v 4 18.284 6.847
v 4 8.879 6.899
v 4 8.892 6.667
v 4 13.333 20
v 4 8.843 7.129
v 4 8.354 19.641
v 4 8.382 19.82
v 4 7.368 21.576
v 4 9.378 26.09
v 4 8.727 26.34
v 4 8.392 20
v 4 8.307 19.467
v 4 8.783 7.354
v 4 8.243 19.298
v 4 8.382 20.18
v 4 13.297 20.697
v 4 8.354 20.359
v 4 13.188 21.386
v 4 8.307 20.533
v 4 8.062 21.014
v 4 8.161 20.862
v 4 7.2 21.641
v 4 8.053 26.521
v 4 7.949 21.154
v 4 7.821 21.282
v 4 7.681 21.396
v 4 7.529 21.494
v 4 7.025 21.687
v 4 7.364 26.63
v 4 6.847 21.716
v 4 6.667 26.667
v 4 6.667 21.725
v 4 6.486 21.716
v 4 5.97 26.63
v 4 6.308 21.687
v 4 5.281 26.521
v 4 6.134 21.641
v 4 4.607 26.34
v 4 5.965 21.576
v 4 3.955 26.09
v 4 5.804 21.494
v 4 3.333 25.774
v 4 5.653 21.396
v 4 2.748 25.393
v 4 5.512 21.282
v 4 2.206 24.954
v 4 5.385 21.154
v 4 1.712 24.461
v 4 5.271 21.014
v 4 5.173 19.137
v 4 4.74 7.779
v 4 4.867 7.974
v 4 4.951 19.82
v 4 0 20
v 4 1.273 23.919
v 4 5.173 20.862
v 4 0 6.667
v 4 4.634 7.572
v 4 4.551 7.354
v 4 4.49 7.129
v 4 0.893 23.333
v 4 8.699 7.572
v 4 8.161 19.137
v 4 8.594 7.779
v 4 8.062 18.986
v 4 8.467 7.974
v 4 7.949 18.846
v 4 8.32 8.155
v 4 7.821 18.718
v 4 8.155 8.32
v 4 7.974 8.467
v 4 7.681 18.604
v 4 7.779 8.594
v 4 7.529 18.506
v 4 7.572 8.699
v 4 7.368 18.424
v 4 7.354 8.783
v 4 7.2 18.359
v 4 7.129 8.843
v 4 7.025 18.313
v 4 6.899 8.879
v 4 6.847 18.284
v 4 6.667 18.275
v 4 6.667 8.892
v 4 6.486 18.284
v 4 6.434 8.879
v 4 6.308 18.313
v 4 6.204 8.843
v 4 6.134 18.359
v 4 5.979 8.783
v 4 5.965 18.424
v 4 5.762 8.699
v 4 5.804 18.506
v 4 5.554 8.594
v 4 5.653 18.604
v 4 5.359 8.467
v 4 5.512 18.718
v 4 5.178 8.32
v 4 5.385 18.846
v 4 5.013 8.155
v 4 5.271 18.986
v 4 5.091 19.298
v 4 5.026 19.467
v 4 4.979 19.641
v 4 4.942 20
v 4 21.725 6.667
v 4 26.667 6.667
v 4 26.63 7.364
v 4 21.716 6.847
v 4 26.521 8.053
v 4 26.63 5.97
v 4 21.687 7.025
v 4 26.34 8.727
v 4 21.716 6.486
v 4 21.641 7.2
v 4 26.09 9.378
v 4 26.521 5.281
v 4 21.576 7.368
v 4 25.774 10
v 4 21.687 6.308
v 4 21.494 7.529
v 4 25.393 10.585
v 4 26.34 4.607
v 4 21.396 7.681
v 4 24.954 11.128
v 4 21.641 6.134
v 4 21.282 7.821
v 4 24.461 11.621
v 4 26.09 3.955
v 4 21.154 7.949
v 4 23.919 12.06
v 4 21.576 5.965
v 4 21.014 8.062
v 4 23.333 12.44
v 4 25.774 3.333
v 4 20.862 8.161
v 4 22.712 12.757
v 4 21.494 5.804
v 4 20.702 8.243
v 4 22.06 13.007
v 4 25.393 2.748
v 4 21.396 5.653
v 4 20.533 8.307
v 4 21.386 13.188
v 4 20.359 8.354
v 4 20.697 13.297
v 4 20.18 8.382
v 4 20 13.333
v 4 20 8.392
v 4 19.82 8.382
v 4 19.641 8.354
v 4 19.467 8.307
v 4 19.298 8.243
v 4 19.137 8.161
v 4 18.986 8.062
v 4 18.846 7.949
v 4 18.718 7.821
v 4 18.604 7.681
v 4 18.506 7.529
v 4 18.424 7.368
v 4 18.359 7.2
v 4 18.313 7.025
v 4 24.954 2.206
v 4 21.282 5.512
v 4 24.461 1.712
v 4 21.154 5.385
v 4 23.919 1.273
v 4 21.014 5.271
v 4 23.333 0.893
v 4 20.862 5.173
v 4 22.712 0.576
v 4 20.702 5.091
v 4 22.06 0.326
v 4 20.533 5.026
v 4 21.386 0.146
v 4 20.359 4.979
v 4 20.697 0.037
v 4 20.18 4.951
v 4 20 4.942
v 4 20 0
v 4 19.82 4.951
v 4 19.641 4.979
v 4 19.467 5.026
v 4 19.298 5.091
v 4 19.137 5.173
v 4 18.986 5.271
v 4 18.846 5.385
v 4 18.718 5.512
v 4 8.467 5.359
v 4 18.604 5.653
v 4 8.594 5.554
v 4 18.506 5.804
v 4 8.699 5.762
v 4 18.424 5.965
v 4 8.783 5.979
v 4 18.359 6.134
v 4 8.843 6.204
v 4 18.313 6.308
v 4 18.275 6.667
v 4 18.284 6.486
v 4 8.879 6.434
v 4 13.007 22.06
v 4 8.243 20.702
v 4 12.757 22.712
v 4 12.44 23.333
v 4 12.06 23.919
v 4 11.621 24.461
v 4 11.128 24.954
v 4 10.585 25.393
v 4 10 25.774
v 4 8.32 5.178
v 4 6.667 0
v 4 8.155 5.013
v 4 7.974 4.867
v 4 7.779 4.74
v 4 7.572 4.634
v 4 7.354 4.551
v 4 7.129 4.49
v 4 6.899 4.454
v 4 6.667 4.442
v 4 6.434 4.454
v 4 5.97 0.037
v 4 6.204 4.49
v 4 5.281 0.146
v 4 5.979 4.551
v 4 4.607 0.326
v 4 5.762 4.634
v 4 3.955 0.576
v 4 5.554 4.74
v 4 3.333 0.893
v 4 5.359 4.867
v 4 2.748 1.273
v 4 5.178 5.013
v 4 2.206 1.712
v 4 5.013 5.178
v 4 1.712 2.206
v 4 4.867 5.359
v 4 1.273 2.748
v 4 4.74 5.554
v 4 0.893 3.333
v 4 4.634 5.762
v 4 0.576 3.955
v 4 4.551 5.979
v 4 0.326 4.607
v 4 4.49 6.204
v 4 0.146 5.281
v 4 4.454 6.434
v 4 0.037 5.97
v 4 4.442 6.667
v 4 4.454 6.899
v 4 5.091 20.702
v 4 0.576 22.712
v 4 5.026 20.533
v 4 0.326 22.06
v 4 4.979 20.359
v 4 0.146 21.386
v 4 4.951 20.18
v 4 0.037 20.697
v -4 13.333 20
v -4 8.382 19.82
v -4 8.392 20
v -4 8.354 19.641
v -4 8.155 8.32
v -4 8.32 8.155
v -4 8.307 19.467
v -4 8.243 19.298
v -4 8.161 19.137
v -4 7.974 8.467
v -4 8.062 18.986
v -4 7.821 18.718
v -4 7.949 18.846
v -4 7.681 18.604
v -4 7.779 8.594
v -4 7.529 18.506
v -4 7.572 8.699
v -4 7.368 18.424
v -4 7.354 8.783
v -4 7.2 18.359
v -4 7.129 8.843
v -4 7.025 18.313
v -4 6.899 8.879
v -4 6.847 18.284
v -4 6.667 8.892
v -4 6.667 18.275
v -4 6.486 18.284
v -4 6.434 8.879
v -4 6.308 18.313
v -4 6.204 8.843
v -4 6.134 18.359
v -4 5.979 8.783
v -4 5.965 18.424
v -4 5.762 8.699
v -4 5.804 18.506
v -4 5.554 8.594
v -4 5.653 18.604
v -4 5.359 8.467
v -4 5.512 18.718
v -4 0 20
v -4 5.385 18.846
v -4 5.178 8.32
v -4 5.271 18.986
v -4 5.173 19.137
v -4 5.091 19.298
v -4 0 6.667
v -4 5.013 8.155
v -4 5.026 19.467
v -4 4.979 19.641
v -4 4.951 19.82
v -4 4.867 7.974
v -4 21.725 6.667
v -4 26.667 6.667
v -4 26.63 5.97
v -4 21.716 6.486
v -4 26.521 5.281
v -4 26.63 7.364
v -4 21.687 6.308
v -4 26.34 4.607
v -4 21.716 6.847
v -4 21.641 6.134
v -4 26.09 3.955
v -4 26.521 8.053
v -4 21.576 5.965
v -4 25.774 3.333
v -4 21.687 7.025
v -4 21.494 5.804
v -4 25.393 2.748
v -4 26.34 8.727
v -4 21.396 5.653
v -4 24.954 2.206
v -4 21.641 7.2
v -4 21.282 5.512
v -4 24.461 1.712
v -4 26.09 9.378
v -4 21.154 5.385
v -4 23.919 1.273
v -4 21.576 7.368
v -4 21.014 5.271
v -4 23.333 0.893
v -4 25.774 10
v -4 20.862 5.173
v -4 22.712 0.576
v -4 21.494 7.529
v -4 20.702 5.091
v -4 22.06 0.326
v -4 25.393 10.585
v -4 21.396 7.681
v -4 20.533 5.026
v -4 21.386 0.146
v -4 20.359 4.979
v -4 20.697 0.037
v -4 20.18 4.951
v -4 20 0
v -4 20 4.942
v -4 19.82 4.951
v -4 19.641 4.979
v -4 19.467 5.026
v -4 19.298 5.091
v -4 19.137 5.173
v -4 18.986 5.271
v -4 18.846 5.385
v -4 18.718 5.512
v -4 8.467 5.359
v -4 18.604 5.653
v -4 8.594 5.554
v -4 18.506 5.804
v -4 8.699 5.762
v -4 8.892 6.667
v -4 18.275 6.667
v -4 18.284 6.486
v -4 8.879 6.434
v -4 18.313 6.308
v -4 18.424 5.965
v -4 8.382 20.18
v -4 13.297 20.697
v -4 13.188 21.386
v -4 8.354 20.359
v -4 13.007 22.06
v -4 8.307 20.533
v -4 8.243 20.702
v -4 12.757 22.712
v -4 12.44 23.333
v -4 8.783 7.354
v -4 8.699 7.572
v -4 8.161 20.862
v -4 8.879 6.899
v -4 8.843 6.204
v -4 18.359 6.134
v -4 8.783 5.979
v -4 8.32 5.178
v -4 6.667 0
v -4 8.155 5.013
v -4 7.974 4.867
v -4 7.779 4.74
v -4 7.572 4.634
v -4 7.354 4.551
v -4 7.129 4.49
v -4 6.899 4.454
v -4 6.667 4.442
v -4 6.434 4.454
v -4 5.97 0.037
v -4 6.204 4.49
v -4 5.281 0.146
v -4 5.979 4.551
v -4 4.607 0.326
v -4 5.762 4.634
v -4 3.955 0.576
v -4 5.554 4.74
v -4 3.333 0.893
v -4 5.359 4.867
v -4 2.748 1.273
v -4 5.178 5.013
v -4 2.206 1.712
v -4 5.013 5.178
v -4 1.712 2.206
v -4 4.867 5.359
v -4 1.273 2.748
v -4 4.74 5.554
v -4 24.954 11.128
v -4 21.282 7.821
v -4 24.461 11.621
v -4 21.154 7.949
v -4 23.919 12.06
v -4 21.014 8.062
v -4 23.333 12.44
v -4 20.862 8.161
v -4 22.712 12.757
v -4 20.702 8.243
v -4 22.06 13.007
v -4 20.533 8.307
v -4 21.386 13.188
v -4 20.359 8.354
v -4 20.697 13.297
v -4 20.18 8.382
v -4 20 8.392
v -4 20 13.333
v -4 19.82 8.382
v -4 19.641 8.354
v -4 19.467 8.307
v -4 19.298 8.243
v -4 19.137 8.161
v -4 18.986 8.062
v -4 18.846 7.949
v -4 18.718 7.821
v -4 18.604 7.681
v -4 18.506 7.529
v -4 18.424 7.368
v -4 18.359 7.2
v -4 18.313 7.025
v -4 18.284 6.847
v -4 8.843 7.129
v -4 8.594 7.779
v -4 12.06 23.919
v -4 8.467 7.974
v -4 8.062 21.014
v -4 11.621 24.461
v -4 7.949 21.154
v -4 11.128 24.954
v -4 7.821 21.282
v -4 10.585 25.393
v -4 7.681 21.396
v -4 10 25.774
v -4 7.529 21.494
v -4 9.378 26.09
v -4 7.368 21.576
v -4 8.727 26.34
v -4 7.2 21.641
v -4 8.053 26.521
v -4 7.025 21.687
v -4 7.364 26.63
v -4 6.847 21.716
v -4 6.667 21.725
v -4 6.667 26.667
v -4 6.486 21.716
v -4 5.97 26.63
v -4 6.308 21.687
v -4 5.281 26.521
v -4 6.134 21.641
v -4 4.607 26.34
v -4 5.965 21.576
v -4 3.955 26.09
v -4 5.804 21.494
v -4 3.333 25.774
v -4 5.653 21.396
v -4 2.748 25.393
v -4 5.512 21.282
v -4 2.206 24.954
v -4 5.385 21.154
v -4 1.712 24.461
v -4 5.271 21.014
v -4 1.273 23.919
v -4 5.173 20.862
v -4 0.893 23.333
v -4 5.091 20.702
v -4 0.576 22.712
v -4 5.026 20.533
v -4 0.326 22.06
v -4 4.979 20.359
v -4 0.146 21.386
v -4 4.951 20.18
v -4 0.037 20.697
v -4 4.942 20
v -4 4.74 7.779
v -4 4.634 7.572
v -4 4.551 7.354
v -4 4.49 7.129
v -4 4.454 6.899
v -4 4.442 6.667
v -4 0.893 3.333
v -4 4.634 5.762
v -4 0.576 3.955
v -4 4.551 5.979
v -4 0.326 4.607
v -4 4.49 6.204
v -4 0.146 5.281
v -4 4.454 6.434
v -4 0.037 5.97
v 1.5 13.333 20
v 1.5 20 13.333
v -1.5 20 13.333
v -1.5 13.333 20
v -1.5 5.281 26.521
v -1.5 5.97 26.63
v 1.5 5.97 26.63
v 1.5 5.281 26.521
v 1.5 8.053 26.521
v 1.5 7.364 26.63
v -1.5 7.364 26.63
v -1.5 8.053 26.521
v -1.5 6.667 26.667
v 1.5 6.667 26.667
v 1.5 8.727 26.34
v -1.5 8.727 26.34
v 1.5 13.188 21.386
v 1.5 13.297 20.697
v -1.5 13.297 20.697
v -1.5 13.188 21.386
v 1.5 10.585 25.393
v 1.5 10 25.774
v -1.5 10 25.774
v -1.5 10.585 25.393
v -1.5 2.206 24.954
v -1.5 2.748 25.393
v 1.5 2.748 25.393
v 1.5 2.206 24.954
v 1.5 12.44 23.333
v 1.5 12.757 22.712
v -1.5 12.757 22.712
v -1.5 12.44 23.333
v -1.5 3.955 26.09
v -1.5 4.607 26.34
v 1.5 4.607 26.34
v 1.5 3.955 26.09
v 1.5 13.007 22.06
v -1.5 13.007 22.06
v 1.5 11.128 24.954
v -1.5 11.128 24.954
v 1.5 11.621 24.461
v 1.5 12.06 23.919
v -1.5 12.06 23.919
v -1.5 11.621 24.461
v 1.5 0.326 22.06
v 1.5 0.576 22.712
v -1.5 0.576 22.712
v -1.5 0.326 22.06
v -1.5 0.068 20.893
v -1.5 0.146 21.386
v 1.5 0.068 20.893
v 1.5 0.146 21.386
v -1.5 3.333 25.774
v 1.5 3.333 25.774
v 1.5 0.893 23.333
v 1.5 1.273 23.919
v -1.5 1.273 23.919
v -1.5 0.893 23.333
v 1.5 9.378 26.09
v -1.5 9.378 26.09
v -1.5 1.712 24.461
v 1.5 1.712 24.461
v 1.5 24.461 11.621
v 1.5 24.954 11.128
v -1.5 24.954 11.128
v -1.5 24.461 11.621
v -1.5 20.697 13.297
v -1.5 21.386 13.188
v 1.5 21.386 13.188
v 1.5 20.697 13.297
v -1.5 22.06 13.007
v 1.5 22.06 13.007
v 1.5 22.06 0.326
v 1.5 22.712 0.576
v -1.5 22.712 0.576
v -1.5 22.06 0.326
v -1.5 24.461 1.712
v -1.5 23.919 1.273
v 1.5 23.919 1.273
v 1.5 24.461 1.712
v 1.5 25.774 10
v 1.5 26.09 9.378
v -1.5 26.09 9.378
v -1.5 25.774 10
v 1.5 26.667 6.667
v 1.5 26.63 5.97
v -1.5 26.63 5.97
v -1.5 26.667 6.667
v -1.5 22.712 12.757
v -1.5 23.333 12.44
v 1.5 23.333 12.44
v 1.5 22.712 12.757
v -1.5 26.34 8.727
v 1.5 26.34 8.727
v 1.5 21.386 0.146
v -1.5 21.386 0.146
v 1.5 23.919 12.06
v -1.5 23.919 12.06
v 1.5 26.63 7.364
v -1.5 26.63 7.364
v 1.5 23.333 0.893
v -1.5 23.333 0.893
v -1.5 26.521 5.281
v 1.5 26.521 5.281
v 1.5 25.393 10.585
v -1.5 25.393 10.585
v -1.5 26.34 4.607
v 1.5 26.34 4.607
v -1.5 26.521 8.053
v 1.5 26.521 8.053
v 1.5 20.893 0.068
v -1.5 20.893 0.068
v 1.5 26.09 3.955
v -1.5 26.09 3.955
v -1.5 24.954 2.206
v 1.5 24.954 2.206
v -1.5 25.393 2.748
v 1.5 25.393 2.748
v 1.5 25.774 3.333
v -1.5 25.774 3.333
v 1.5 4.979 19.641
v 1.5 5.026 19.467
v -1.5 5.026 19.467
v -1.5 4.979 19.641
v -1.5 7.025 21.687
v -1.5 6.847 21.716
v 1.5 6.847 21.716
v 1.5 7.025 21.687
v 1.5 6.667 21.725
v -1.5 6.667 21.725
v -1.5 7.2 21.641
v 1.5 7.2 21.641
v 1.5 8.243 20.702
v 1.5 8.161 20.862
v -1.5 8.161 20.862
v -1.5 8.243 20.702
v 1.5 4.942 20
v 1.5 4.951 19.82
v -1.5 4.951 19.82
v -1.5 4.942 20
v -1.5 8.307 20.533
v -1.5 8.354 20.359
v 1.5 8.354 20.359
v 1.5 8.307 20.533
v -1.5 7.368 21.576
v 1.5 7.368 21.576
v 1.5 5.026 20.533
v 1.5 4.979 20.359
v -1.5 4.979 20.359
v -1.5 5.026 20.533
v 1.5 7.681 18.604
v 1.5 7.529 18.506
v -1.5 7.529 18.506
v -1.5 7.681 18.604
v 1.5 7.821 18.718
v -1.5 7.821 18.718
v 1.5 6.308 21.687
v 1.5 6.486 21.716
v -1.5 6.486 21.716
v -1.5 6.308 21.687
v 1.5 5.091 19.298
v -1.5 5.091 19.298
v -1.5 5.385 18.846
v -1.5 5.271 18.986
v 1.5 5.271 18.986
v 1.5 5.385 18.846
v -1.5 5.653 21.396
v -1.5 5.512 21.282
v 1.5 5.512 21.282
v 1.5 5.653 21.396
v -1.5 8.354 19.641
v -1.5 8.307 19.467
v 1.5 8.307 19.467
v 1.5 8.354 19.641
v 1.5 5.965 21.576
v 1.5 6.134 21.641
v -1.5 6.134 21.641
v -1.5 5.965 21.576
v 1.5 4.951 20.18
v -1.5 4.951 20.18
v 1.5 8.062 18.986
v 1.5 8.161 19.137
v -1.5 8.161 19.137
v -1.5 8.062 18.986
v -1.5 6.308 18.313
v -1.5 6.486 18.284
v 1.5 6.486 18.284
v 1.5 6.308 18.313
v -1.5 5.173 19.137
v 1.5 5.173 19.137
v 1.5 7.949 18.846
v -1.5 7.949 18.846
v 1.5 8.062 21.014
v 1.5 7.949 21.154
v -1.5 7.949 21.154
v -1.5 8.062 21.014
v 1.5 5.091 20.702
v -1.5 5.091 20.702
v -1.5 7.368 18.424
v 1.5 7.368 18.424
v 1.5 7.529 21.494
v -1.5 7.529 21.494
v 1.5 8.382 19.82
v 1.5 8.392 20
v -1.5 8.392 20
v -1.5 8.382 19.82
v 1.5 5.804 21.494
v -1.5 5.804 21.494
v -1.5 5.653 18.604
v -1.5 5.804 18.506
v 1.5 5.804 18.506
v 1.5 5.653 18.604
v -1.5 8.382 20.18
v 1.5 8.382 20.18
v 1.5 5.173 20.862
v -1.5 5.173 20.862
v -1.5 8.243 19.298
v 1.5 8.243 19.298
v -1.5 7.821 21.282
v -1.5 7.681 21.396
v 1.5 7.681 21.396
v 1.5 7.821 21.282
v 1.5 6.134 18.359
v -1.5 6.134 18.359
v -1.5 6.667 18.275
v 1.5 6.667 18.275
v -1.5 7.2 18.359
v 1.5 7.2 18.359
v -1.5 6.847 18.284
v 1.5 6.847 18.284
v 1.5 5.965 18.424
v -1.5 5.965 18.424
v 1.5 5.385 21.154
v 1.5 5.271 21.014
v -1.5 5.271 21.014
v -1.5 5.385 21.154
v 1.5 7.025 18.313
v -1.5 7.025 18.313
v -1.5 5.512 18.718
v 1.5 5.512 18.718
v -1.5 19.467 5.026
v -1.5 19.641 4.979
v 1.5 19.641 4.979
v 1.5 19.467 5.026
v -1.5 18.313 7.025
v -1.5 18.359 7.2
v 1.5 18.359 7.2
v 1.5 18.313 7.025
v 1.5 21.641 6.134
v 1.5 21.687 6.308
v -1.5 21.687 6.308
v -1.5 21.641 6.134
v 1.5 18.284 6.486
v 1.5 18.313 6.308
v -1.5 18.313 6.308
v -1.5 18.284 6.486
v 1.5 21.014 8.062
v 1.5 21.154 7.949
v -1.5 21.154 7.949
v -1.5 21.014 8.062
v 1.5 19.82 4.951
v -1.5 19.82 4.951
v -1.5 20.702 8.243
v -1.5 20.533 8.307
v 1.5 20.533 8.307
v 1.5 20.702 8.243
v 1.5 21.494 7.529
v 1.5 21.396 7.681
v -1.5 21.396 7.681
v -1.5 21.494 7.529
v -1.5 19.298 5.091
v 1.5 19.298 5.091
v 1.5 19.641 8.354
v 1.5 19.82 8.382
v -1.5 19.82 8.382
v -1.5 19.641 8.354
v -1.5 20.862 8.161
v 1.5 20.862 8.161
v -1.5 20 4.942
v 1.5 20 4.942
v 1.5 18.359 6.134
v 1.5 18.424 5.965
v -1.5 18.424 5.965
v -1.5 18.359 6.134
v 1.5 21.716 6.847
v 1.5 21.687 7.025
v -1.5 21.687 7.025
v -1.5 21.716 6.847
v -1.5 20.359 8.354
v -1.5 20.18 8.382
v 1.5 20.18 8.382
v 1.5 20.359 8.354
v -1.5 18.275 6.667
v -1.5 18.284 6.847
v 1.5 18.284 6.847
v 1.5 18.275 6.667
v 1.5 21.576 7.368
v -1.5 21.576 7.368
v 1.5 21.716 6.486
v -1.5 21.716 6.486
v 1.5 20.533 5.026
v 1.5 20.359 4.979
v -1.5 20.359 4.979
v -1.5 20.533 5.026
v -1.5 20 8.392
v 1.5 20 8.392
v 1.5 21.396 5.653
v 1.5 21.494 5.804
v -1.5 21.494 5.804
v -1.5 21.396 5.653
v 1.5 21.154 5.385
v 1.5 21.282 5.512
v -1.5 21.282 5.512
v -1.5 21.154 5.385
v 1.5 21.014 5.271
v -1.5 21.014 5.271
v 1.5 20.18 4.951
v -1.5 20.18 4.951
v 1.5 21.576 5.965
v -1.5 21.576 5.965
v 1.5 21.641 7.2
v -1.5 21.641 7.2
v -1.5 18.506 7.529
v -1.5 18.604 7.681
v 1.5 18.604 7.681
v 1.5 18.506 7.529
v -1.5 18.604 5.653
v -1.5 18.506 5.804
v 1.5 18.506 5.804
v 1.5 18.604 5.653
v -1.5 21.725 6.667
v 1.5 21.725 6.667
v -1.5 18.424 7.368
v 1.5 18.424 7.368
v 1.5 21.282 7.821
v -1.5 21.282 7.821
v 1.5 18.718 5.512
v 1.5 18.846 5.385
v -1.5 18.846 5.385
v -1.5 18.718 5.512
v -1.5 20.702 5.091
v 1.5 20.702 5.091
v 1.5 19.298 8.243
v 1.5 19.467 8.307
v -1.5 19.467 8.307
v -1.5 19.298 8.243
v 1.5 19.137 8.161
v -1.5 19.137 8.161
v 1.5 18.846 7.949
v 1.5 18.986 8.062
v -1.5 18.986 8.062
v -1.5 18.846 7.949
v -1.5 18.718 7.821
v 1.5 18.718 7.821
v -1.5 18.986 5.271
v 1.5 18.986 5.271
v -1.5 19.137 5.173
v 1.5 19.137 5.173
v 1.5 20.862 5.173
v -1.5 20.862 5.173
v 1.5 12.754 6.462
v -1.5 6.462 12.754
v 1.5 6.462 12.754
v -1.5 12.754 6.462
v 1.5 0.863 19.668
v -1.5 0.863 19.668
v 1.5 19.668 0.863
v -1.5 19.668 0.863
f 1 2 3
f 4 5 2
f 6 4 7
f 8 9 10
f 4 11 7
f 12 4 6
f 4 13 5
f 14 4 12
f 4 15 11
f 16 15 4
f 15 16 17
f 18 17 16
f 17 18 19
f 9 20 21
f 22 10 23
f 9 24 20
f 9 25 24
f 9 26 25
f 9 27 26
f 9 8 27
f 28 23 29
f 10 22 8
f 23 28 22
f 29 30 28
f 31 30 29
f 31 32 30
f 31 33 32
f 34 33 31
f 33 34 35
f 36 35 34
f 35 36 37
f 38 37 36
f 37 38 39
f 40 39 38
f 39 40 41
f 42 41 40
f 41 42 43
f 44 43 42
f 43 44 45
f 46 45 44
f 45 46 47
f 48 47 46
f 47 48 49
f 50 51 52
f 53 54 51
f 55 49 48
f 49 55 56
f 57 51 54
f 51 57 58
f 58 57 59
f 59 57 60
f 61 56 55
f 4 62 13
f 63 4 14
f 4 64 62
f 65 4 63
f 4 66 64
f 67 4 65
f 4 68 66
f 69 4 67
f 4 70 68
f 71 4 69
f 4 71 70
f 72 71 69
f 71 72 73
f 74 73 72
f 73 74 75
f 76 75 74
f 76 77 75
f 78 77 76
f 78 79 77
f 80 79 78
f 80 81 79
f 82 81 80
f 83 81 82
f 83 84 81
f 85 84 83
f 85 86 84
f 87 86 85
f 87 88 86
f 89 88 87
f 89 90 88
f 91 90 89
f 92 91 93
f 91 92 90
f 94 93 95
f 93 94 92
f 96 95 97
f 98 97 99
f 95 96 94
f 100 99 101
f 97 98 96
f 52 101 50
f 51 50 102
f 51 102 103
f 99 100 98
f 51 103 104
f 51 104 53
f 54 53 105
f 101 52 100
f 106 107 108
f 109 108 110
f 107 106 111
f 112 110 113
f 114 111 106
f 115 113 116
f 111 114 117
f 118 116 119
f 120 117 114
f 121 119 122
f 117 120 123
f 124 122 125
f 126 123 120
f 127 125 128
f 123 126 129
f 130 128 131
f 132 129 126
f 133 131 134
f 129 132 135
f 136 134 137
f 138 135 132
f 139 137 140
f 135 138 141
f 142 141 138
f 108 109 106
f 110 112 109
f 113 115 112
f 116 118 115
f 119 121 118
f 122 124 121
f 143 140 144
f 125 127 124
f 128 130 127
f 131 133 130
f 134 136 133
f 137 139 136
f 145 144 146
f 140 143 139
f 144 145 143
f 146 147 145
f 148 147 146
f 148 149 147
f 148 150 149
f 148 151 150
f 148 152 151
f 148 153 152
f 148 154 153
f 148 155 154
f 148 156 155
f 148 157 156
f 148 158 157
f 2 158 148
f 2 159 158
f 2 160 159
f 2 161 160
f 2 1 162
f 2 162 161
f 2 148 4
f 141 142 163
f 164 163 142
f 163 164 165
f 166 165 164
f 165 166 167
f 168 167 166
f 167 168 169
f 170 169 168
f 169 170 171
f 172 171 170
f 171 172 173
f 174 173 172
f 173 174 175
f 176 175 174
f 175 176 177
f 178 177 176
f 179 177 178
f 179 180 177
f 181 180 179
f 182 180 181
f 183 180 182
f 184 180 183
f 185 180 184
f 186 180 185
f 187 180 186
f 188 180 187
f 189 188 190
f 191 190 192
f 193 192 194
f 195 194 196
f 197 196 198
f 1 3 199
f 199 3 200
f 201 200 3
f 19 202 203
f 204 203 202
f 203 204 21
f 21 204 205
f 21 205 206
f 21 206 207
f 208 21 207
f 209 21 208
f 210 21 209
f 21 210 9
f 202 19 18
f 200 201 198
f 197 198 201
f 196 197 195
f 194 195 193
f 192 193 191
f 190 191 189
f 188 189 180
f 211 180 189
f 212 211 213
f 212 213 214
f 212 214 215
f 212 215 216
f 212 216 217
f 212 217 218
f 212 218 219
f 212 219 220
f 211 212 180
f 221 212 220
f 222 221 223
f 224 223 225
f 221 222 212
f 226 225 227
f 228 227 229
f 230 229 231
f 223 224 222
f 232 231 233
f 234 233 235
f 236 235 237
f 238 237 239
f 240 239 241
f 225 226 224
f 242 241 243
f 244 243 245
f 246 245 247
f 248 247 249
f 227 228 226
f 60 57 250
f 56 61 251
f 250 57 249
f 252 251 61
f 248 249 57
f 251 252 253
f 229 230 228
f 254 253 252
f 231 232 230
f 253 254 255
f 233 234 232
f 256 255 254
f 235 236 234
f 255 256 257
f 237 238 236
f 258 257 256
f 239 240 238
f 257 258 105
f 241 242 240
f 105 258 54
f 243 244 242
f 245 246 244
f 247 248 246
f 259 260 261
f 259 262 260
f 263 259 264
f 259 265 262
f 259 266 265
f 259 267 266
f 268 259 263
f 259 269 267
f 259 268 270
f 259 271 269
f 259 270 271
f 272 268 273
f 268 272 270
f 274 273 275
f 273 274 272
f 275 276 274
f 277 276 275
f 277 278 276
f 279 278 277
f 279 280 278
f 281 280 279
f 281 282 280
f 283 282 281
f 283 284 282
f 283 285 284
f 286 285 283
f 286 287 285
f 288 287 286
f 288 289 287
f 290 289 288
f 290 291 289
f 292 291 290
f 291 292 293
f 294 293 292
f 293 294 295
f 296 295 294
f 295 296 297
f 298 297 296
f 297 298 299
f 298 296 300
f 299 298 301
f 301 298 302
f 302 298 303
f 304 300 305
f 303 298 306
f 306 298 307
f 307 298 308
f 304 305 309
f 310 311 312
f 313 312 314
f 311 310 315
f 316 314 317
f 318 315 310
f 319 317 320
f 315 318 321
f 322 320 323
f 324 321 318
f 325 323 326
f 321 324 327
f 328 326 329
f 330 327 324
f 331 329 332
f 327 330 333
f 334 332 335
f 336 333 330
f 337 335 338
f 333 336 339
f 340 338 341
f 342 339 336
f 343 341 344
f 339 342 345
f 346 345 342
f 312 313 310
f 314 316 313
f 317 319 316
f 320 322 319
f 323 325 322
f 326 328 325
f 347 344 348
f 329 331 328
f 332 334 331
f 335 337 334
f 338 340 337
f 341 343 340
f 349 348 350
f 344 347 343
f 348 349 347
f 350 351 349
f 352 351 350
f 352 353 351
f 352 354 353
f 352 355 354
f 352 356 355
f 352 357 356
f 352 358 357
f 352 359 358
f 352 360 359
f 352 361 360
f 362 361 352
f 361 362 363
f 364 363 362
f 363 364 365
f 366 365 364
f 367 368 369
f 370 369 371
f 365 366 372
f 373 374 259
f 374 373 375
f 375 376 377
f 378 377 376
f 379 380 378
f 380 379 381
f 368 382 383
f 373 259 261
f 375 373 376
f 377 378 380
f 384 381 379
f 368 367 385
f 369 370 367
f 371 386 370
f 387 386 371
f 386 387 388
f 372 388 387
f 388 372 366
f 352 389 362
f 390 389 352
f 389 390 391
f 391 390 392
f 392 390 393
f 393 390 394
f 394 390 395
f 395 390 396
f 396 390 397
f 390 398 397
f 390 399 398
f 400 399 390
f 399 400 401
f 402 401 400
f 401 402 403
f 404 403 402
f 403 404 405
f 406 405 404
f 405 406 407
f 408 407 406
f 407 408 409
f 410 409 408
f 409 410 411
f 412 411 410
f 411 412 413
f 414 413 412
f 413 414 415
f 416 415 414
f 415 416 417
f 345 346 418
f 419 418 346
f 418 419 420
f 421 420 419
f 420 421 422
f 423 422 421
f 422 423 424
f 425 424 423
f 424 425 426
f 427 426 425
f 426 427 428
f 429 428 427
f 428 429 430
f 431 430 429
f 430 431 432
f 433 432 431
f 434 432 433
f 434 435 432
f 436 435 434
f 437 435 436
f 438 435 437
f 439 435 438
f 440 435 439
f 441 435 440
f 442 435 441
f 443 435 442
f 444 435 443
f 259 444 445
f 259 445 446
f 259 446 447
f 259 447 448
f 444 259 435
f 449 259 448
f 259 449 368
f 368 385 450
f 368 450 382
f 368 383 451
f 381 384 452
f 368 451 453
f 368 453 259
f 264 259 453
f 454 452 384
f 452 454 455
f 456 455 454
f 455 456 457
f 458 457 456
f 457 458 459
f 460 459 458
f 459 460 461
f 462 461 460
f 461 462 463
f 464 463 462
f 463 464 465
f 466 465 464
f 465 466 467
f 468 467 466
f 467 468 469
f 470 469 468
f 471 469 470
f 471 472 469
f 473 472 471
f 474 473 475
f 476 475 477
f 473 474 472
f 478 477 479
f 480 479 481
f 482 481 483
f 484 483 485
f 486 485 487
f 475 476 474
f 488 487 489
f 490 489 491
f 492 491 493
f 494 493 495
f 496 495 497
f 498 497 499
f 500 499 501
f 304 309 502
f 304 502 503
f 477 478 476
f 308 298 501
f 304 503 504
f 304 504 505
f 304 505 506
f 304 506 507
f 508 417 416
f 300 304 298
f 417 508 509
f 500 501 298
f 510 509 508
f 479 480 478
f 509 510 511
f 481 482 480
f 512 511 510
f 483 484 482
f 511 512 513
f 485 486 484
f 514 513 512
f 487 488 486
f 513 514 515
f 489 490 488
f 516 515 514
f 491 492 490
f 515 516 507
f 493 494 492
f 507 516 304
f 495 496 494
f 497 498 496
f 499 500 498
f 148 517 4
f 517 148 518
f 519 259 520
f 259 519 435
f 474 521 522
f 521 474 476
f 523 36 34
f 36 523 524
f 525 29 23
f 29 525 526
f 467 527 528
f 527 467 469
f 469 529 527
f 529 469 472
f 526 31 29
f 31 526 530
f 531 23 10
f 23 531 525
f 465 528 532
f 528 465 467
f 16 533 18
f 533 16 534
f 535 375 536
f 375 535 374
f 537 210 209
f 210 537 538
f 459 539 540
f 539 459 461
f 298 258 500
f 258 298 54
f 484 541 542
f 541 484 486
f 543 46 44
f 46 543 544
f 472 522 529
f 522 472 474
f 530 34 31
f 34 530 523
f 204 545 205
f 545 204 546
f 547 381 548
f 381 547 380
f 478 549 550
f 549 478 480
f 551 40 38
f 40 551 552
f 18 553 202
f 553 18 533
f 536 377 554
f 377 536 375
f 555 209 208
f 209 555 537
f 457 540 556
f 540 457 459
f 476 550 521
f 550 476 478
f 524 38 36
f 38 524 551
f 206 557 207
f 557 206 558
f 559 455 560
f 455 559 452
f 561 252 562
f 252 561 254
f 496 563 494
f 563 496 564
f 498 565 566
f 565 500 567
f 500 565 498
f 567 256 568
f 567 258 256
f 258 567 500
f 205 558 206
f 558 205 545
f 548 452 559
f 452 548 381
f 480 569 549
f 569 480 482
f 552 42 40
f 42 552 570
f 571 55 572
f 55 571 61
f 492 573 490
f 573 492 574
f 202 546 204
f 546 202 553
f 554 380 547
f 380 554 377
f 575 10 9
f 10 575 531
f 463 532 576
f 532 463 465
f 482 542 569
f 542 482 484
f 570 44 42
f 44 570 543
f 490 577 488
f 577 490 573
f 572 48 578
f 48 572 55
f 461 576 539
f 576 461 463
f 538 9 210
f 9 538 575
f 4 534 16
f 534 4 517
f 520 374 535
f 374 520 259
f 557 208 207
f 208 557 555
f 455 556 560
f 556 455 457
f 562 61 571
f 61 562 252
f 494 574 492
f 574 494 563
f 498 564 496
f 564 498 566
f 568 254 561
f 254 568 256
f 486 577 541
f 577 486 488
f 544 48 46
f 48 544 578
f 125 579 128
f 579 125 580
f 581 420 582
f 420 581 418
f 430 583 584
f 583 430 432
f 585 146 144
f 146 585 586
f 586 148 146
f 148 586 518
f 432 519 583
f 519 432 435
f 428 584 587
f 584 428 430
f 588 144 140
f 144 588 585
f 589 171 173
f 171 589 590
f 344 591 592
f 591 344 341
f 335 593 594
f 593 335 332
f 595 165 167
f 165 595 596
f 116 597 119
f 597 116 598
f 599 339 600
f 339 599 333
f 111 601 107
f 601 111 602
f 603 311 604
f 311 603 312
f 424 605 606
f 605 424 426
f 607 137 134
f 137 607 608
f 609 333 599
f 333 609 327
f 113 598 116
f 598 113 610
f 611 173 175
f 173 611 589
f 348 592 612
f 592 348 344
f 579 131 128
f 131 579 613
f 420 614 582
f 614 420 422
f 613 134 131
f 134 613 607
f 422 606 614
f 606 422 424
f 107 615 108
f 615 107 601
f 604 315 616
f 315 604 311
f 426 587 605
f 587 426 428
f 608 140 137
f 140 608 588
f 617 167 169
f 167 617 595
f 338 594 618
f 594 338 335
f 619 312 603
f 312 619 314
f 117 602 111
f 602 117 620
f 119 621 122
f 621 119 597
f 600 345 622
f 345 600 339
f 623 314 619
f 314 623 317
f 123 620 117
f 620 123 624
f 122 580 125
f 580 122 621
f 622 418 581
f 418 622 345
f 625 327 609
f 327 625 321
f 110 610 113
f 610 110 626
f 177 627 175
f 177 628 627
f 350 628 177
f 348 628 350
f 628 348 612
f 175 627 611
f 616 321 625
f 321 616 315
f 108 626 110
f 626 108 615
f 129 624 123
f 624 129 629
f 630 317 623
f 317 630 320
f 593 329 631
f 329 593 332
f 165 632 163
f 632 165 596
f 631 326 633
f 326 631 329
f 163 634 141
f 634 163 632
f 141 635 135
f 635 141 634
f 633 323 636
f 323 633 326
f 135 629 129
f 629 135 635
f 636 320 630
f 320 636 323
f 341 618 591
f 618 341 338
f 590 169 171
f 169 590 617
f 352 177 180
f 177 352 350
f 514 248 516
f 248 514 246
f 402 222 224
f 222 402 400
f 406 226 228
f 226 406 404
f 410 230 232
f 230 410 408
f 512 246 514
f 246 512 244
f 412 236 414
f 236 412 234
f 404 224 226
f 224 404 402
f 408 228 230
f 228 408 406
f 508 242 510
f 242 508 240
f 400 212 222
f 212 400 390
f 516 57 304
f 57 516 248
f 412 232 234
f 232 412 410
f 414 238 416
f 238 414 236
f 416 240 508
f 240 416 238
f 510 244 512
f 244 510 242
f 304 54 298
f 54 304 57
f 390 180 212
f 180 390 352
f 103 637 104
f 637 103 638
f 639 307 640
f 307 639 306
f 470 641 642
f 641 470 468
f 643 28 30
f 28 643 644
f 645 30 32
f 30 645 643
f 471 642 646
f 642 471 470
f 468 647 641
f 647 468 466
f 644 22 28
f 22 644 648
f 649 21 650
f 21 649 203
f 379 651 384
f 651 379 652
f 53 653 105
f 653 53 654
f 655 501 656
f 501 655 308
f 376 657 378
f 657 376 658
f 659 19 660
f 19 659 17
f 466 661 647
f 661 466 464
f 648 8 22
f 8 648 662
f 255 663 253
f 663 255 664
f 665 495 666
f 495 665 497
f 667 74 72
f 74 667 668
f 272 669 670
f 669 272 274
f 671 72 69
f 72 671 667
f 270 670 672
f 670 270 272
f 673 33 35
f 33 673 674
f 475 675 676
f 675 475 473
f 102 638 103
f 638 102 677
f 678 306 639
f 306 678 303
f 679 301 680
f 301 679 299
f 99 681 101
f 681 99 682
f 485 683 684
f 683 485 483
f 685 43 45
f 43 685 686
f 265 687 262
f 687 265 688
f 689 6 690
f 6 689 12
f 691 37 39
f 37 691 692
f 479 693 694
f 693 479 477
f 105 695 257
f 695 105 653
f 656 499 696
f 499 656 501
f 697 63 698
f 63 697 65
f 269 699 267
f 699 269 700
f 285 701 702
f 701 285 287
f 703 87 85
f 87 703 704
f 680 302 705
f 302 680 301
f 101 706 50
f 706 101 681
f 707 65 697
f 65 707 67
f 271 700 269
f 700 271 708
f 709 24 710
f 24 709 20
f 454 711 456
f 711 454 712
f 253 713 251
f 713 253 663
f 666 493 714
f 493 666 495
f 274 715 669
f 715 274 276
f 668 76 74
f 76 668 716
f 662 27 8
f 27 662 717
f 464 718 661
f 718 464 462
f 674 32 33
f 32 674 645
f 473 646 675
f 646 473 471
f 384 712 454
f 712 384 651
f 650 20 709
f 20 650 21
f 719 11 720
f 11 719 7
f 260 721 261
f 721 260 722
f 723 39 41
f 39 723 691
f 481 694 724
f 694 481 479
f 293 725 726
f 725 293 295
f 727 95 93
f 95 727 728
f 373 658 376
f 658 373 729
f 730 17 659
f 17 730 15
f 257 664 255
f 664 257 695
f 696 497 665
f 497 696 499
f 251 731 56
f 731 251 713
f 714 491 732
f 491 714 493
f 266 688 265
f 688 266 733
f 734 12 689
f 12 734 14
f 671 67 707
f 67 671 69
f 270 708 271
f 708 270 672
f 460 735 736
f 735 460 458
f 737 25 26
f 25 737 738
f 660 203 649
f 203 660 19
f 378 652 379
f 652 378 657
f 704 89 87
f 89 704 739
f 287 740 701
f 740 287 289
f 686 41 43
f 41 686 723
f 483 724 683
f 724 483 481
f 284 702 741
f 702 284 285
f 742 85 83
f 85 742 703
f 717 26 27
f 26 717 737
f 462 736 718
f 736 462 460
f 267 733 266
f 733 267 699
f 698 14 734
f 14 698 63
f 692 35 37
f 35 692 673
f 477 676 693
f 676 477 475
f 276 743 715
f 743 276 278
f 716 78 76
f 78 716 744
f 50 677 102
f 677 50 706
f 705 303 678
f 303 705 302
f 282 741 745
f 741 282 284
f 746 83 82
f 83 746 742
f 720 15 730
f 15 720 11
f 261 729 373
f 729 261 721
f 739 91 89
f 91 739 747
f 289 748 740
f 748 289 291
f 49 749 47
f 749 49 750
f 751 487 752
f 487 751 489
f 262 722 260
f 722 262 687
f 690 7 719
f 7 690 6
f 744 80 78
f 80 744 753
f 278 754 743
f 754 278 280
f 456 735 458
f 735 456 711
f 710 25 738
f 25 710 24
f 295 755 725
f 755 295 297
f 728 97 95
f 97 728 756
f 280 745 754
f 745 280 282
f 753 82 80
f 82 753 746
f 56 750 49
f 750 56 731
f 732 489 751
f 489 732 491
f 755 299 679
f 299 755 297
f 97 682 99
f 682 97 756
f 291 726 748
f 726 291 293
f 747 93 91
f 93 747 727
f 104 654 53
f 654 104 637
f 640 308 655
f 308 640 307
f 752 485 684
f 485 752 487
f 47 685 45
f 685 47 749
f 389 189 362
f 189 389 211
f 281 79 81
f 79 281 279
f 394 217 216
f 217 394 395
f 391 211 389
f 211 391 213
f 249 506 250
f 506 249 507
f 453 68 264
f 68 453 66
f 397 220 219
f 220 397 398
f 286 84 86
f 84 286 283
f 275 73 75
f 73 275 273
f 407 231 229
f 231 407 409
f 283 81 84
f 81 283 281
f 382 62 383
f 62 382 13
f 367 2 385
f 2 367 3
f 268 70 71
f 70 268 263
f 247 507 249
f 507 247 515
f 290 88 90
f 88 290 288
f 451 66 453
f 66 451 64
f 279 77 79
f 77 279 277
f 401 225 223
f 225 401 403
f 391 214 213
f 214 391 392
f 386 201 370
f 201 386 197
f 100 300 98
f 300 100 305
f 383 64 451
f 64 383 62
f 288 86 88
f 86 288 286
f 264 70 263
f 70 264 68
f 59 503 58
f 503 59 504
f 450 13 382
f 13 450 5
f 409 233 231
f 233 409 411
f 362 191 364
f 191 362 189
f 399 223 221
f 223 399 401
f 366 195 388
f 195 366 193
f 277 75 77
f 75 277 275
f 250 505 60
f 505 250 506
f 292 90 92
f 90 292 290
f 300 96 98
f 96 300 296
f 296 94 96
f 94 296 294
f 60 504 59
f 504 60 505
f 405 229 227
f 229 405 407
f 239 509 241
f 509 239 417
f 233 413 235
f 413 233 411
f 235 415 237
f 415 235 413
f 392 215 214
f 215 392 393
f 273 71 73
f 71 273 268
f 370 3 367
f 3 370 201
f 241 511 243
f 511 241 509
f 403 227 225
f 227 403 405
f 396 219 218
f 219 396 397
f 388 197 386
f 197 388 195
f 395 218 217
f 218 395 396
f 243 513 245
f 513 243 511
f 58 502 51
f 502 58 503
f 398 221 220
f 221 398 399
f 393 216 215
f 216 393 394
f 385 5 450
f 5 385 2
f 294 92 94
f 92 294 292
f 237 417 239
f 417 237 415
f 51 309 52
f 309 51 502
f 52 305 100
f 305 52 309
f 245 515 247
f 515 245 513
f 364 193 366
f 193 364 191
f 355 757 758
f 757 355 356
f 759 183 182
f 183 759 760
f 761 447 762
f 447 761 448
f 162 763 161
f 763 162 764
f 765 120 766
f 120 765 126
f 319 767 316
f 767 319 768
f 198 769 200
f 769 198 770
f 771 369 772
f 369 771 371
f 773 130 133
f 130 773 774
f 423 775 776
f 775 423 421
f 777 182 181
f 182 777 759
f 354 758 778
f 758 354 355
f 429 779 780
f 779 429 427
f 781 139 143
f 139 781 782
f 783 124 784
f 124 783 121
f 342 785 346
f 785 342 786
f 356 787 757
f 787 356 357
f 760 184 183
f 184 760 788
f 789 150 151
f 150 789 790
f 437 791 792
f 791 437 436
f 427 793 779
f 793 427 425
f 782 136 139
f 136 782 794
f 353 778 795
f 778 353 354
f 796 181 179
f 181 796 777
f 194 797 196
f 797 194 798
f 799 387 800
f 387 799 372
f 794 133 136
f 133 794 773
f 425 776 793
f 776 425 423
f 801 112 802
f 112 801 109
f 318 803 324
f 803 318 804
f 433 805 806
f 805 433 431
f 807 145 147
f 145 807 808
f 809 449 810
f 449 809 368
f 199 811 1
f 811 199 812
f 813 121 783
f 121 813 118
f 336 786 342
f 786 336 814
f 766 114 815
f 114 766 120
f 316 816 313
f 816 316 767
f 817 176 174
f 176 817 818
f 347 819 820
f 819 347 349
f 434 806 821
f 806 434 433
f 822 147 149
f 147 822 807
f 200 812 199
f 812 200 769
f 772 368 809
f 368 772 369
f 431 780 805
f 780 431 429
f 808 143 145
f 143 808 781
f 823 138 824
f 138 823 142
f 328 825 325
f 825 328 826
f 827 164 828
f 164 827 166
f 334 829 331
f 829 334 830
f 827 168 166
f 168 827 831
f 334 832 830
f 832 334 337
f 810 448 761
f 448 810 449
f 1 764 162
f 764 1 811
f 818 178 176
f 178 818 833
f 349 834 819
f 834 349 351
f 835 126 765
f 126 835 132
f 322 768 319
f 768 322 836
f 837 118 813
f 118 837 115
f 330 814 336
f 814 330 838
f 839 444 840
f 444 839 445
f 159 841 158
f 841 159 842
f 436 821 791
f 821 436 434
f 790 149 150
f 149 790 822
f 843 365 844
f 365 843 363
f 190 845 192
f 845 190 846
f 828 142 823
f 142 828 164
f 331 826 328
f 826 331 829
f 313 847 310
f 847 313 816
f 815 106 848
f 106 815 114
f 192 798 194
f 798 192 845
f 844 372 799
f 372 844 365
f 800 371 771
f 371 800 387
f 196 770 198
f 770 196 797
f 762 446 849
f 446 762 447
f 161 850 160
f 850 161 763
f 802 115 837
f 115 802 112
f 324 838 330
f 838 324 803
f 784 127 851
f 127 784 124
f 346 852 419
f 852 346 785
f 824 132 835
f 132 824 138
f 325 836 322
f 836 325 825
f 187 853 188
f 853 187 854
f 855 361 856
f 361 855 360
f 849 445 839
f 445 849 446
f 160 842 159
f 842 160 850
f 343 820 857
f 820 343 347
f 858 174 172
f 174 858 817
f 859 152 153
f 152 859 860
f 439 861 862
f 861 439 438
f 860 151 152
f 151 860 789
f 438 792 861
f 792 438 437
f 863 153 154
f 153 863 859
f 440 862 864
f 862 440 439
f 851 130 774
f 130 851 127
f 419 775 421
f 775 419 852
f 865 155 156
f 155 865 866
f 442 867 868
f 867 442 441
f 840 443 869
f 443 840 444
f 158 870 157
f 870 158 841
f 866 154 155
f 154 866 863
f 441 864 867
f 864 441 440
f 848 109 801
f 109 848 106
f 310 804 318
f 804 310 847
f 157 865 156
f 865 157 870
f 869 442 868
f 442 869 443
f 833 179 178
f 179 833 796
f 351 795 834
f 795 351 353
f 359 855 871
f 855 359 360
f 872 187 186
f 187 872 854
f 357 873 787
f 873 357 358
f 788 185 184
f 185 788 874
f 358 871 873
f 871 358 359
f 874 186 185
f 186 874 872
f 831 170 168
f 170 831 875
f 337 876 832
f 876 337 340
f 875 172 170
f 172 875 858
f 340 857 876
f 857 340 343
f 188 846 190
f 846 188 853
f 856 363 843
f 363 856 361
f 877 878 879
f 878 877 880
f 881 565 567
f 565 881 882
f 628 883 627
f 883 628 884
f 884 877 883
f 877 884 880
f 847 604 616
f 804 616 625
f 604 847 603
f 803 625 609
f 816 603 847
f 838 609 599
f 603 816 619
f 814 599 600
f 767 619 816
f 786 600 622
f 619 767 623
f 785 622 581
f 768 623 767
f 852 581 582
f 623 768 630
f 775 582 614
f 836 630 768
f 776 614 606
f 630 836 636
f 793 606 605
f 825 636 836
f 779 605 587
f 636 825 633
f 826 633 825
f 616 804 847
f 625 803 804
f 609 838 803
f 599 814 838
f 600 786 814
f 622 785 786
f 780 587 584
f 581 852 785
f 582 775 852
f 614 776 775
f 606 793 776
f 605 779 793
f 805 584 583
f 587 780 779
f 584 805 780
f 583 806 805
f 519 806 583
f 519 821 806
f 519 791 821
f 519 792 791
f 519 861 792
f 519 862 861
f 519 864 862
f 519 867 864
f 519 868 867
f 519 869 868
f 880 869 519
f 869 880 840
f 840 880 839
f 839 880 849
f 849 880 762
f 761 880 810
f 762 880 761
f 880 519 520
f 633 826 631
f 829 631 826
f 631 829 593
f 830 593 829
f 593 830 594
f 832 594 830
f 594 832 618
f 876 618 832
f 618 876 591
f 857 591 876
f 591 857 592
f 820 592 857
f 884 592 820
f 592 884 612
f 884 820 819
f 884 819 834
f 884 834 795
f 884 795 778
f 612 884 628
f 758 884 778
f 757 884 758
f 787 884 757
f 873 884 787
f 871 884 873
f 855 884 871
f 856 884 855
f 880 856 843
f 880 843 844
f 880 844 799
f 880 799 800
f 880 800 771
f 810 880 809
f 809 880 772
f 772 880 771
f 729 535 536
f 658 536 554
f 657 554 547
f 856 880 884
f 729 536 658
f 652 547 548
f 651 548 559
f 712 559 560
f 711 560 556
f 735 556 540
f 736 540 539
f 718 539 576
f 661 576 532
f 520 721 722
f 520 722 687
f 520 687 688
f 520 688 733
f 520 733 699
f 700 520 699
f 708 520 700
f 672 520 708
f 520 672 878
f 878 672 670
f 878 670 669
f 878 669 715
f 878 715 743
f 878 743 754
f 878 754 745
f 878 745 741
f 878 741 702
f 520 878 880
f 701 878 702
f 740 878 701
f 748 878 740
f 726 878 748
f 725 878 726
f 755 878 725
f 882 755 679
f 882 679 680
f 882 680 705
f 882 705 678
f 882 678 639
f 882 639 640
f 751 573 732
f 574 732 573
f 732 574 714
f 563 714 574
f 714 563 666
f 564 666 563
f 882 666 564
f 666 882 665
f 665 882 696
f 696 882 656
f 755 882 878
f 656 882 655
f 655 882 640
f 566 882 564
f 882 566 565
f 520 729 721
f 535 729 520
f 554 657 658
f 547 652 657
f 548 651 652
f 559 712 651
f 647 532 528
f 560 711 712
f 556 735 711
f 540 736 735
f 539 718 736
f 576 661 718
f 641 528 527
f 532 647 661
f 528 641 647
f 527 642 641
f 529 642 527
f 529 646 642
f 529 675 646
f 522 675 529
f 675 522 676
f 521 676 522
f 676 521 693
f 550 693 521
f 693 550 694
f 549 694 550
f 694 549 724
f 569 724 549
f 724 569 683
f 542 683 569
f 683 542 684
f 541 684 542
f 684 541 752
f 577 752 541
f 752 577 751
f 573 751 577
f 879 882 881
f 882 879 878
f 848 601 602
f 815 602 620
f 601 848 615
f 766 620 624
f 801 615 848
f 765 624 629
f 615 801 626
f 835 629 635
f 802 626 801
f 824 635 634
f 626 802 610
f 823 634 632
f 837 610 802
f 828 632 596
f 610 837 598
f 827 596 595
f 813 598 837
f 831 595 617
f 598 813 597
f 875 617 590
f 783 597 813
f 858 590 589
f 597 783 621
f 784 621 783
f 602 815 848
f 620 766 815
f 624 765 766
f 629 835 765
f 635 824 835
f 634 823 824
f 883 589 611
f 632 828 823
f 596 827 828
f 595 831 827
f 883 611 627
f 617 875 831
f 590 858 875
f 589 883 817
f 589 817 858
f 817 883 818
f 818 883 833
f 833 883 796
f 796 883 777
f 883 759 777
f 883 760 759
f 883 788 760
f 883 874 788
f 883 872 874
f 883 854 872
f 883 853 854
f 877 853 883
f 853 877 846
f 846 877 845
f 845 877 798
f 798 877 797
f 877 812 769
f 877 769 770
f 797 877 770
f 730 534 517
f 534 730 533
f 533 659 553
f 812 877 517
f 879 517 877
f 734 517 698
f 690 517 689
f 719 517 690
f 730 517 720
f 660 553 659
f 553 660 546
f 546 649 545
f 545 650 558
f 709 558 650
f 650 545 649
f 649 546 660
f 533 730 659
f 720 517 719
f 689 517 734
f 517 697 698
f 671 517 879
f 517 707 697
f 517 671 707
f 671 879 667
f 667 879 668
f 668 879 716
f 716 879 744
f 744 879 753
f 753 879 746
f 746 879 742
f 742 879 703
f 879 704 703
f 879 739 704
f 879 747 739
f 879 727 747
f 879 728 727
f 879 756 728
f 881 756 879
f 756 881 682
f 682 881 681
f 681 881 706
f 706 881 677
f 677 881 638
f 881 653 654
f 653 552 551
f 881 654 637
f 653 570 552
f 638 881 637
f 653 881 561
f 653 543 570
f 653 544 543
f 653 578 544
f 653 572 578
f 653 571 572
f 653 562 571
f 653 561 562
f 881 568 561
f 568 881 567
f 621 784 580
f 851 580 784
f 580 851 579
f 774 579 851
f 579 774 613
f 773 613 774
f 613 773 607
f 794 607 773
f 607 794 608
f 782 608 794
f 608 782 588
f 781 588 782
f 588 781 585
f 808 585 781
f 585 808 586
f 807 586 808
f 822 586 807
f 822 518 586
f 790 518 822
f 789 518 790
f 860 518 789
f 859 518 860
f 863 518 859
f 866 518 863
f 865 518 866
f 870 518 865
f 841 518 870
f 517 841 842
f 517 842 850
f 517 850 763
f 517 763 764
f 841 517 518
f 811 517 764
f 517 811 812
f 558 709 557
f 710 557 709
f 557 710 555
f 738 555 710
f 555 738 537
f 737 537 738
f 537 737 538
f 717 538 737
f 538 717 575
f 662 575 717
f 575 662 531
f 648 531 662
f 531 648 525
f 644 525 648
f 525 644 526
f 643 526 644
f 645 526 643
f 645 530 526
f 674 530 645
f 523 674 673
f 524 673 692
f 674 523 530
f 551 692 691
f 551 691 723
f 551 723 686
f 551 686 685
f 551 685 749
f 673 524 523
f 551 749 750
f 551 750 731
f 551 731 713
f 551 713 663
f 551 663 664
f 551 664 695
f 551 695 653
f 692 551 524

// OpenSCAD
// file: configuration.scad
// Increase this if your slicer or printer make holes too tight.
extra_radius = 0.1;

// OD = outside diameter, corner to corner.
m3_nut_od = 6.1;
m3_nut_radius = m3_nut_od/2 + 0.2 + extra_radius;
m3_washer_radius = 3.5 + extra_radius;

// Major diameter of metric 3mm thread.
m3_major = 2.85;
m3_radius = m3_major/2 + extra_radius;
m3_wide_radius = m3_major/2 + extra_radius + 0.2;

// NEMA17 stepper motors.
motor_shaft_diameter = 5;
motor_shaft_radius = motor_shaft_diameter/2 + extra_radius;

// Frame brackets. M3x8mm screws work best with 3.6 mm brackets.
thickness = 3.6;

// OpenBeam or Misumi. Currently only 15x15 mm, but there is a plan
// to make models more parametric and allow 20x20 mm in the future.
extrusion = 15;

// Placement for the NEMA17 stepper motors.
motor_offset = 44;
motor_length = 47;
// file: triangle.scad
//triangle.scad
/*         C
           .
          / \
       b /   \ a
        /     \
      A.-------.B
           c
   Triangle referenced in these modules:
   side c is the base opposite angle C
   b is the upper left side opposite angle B
   a is the upper right side opposite angle A
   angle A will be at the origin
	center moves the triangle down half its height
*/
// usage: rTriangle(center=true);
module rTriangle(c=8, b=4, h=1, center=false){
  rightTriangle(c, b, h, center);
}
module rightTriangle(c=3, b=4, h=1, center=false)
{// b is y, c is x 
  q = center==true ? 1 : 0;
  translate([0, 0, -q*h/2])
  linear_extrude(height=h)
  polygon(points=[[0,0],[0,b],[c,0]],paths=[[0,1,2]]);
}

// usage: hlTriangle(center=true);
module hlTriangle(hyp=8, leg=4, h=1, center=false){
  hypotenuseLegTriangle(hyp, leg, h, center);
}//leg is the y, s the x
module hypotenuseLegTriangle(hyp=5, leg=4, h=1, center=false){
  s=sqrt(hyp*hyp-leg*leg);
  rightTriangle(s, leg, h, center);
}

// usage: iTriangle(5,30,1,true);
module iTriangle(side=5, angle=30, h=1, center=false){
  isoscelesTriangle(side, angle, h, center);
}
module isoscelesTriangle(side=5, angle=30, h=1, center=false){// side is the length of the egual sides of the included angle
  q = center==true ? 1 : 0;
  baseAngle=(180-angle)/2;
  y=side*sin(baseAngle);
  x=2*side*sin(angle/2);

  translate([0, 0, -q*h/2])
  linear_extrude(height=h)
  polygon(points=[[0,0],[x/2,y],[x,0]],paths=[ [0,1,2] ]);
}

// usage: eTriangle(5,1,true);
module eTriangle(side=5, h=1, center=false){
  equilateralTriangle(side, h, center);
}//Equilateral triangle is special case isosceles triangle.
module equilateralTriangle(side=5, h=1, center=false){
  isoscelesTriangle(side, 60, h, center);
}

// usage: sasTriangle(center=true);
module sasTriangle(b=6, A=120, c=5, h=1, center=false){
  // c is the base of the triangle
  // b is the upper left side
  // A is the included A
  q = center==true ? 1 : 0;
  
  translate([0,0,-h/2*q])
  linear_extrude(height=h)
  if (A <= 90){
    polygon(points=[[0,0],[b*cos(A),b*sin(A)],[c,0]],paths=[ [0,1,2] ]);
  }else{ // > 90
    polygon(points=[[0,0],[-b*cos(180-A),b*sin(180-A)],[c,0]],paths=[[0,1,2]]);
  }
}

// usage: asaTriangle(center=true);
module asaTriangle(A=120, c=4, B=30, h=1, center=false){// arbitrarly the first angle is the left one upper of the 4 possible positions.
  C = 180 - A - B;//third angle opposite side c.
  // Law of sines: b/sin(B) = c/sin(C) so:
  b = c*sin(B)/sin(C);

  sasTriangle(b,A,c,h,center);  
}

// usage: sssTriangle(center=true);
module sssTriangle(a=6,b=3,c=8,h=1,center=false){
  // sum of a and b must be larger than c
  // law of cosines: 
  A = acos((b*b + c*c - a*a)/(2*b*c));

  sasTriangle(b,A,c,h,center);
}

//usage: trapezoid(center=true);
module trapezoid(th=6, tw=15, eh=10, alpha=60, center=false){
	/* regular trapezoid
	th=trapezoid height
   tw=trapezoid major side width
	eh=extrusion height
   alpha=degree measure of acute angles
   */
	// Included with triangles since a trapezoid is a truncated triangle...  ;)
	x=th/tan(alpha);

	if(center==true){
		translate([-tw/2,0,-eh/2])
		linear_extrude(height=eh) 
		polygon(points=[ [0,0],[x,th],[tw-x,th],[tw,0] ],
				  paths=[ [0,1,2,3] ]);
	} else {
		linear_extrude(height=eh) 
		polygon(points=[ [0,0],[x,th],[tw-x,th],[tw,0] ],
				  paths=[ [0,1,2,3] ]);
	}
}
// main file
include <triangle.scad>
include <configuration.scad>

plate_radius=170/2;
plate_height=3;
clip_lip=2;
offset_multiplier=1.35;
clip_thickness=clip_lip+plate_height*2;
triangle_side=20;
triangle_hypotenuse=triangle_side*sqrt(2);
corner_radius=triangle_side/3;

rotate([0,-90,0]){
translate([corner_radius,corner_radius,0]){
difference(){
union(){
sssTriangle(triangle_hypotenuse, triangle_side, triangle_side, clip_thickness, center=true);

translate([triangle_side*2/3, 0, -clip_thickness/2])
	cylinder(h=clip_thickness, r=corner_radius, $fn=60);

translate([0, triangle_side*2/3, -clip_thickness/2])
	cylinder(h=clip_thickness, r=corner_radius, $fn=60);

translate([0, 0, -clip_thickness/2])
	cylinder(h=clip_thickness, r=corner_radius, $fn=60);

translate([0, -corner_radius, -clip_thickness/2])
	cube([corner_radius*2, corner_radius, clip_thickness]);

translate([-corner_radius, 0, -clip_thickness/2])
	cube([corner_radius, corner_radius*2, clip_thickness]);
}

translate([triangle_side*2/3, 0, -clip_thickness/2])
	cylinder(h=clip_thickness, r=m3_wide_radius, $fn=60);

translate([0, 0, -clip_thickness/2])
	cylinder(h=clip_thickness, r=m3_wide_radius+.5, $fn=60);

translate([0, triangle_side*2/3, -clip_thickness/2])
	cylinder(h=clip_thickness, r=m3_wide_radius, $fn=60);

translate([plate_radius/offset_multiplier, plate_radius/offset_multiplier, -plate_height/2])
	cylinder(h=plate_height, r=plate_radius, $fn=60);
}
}
}
